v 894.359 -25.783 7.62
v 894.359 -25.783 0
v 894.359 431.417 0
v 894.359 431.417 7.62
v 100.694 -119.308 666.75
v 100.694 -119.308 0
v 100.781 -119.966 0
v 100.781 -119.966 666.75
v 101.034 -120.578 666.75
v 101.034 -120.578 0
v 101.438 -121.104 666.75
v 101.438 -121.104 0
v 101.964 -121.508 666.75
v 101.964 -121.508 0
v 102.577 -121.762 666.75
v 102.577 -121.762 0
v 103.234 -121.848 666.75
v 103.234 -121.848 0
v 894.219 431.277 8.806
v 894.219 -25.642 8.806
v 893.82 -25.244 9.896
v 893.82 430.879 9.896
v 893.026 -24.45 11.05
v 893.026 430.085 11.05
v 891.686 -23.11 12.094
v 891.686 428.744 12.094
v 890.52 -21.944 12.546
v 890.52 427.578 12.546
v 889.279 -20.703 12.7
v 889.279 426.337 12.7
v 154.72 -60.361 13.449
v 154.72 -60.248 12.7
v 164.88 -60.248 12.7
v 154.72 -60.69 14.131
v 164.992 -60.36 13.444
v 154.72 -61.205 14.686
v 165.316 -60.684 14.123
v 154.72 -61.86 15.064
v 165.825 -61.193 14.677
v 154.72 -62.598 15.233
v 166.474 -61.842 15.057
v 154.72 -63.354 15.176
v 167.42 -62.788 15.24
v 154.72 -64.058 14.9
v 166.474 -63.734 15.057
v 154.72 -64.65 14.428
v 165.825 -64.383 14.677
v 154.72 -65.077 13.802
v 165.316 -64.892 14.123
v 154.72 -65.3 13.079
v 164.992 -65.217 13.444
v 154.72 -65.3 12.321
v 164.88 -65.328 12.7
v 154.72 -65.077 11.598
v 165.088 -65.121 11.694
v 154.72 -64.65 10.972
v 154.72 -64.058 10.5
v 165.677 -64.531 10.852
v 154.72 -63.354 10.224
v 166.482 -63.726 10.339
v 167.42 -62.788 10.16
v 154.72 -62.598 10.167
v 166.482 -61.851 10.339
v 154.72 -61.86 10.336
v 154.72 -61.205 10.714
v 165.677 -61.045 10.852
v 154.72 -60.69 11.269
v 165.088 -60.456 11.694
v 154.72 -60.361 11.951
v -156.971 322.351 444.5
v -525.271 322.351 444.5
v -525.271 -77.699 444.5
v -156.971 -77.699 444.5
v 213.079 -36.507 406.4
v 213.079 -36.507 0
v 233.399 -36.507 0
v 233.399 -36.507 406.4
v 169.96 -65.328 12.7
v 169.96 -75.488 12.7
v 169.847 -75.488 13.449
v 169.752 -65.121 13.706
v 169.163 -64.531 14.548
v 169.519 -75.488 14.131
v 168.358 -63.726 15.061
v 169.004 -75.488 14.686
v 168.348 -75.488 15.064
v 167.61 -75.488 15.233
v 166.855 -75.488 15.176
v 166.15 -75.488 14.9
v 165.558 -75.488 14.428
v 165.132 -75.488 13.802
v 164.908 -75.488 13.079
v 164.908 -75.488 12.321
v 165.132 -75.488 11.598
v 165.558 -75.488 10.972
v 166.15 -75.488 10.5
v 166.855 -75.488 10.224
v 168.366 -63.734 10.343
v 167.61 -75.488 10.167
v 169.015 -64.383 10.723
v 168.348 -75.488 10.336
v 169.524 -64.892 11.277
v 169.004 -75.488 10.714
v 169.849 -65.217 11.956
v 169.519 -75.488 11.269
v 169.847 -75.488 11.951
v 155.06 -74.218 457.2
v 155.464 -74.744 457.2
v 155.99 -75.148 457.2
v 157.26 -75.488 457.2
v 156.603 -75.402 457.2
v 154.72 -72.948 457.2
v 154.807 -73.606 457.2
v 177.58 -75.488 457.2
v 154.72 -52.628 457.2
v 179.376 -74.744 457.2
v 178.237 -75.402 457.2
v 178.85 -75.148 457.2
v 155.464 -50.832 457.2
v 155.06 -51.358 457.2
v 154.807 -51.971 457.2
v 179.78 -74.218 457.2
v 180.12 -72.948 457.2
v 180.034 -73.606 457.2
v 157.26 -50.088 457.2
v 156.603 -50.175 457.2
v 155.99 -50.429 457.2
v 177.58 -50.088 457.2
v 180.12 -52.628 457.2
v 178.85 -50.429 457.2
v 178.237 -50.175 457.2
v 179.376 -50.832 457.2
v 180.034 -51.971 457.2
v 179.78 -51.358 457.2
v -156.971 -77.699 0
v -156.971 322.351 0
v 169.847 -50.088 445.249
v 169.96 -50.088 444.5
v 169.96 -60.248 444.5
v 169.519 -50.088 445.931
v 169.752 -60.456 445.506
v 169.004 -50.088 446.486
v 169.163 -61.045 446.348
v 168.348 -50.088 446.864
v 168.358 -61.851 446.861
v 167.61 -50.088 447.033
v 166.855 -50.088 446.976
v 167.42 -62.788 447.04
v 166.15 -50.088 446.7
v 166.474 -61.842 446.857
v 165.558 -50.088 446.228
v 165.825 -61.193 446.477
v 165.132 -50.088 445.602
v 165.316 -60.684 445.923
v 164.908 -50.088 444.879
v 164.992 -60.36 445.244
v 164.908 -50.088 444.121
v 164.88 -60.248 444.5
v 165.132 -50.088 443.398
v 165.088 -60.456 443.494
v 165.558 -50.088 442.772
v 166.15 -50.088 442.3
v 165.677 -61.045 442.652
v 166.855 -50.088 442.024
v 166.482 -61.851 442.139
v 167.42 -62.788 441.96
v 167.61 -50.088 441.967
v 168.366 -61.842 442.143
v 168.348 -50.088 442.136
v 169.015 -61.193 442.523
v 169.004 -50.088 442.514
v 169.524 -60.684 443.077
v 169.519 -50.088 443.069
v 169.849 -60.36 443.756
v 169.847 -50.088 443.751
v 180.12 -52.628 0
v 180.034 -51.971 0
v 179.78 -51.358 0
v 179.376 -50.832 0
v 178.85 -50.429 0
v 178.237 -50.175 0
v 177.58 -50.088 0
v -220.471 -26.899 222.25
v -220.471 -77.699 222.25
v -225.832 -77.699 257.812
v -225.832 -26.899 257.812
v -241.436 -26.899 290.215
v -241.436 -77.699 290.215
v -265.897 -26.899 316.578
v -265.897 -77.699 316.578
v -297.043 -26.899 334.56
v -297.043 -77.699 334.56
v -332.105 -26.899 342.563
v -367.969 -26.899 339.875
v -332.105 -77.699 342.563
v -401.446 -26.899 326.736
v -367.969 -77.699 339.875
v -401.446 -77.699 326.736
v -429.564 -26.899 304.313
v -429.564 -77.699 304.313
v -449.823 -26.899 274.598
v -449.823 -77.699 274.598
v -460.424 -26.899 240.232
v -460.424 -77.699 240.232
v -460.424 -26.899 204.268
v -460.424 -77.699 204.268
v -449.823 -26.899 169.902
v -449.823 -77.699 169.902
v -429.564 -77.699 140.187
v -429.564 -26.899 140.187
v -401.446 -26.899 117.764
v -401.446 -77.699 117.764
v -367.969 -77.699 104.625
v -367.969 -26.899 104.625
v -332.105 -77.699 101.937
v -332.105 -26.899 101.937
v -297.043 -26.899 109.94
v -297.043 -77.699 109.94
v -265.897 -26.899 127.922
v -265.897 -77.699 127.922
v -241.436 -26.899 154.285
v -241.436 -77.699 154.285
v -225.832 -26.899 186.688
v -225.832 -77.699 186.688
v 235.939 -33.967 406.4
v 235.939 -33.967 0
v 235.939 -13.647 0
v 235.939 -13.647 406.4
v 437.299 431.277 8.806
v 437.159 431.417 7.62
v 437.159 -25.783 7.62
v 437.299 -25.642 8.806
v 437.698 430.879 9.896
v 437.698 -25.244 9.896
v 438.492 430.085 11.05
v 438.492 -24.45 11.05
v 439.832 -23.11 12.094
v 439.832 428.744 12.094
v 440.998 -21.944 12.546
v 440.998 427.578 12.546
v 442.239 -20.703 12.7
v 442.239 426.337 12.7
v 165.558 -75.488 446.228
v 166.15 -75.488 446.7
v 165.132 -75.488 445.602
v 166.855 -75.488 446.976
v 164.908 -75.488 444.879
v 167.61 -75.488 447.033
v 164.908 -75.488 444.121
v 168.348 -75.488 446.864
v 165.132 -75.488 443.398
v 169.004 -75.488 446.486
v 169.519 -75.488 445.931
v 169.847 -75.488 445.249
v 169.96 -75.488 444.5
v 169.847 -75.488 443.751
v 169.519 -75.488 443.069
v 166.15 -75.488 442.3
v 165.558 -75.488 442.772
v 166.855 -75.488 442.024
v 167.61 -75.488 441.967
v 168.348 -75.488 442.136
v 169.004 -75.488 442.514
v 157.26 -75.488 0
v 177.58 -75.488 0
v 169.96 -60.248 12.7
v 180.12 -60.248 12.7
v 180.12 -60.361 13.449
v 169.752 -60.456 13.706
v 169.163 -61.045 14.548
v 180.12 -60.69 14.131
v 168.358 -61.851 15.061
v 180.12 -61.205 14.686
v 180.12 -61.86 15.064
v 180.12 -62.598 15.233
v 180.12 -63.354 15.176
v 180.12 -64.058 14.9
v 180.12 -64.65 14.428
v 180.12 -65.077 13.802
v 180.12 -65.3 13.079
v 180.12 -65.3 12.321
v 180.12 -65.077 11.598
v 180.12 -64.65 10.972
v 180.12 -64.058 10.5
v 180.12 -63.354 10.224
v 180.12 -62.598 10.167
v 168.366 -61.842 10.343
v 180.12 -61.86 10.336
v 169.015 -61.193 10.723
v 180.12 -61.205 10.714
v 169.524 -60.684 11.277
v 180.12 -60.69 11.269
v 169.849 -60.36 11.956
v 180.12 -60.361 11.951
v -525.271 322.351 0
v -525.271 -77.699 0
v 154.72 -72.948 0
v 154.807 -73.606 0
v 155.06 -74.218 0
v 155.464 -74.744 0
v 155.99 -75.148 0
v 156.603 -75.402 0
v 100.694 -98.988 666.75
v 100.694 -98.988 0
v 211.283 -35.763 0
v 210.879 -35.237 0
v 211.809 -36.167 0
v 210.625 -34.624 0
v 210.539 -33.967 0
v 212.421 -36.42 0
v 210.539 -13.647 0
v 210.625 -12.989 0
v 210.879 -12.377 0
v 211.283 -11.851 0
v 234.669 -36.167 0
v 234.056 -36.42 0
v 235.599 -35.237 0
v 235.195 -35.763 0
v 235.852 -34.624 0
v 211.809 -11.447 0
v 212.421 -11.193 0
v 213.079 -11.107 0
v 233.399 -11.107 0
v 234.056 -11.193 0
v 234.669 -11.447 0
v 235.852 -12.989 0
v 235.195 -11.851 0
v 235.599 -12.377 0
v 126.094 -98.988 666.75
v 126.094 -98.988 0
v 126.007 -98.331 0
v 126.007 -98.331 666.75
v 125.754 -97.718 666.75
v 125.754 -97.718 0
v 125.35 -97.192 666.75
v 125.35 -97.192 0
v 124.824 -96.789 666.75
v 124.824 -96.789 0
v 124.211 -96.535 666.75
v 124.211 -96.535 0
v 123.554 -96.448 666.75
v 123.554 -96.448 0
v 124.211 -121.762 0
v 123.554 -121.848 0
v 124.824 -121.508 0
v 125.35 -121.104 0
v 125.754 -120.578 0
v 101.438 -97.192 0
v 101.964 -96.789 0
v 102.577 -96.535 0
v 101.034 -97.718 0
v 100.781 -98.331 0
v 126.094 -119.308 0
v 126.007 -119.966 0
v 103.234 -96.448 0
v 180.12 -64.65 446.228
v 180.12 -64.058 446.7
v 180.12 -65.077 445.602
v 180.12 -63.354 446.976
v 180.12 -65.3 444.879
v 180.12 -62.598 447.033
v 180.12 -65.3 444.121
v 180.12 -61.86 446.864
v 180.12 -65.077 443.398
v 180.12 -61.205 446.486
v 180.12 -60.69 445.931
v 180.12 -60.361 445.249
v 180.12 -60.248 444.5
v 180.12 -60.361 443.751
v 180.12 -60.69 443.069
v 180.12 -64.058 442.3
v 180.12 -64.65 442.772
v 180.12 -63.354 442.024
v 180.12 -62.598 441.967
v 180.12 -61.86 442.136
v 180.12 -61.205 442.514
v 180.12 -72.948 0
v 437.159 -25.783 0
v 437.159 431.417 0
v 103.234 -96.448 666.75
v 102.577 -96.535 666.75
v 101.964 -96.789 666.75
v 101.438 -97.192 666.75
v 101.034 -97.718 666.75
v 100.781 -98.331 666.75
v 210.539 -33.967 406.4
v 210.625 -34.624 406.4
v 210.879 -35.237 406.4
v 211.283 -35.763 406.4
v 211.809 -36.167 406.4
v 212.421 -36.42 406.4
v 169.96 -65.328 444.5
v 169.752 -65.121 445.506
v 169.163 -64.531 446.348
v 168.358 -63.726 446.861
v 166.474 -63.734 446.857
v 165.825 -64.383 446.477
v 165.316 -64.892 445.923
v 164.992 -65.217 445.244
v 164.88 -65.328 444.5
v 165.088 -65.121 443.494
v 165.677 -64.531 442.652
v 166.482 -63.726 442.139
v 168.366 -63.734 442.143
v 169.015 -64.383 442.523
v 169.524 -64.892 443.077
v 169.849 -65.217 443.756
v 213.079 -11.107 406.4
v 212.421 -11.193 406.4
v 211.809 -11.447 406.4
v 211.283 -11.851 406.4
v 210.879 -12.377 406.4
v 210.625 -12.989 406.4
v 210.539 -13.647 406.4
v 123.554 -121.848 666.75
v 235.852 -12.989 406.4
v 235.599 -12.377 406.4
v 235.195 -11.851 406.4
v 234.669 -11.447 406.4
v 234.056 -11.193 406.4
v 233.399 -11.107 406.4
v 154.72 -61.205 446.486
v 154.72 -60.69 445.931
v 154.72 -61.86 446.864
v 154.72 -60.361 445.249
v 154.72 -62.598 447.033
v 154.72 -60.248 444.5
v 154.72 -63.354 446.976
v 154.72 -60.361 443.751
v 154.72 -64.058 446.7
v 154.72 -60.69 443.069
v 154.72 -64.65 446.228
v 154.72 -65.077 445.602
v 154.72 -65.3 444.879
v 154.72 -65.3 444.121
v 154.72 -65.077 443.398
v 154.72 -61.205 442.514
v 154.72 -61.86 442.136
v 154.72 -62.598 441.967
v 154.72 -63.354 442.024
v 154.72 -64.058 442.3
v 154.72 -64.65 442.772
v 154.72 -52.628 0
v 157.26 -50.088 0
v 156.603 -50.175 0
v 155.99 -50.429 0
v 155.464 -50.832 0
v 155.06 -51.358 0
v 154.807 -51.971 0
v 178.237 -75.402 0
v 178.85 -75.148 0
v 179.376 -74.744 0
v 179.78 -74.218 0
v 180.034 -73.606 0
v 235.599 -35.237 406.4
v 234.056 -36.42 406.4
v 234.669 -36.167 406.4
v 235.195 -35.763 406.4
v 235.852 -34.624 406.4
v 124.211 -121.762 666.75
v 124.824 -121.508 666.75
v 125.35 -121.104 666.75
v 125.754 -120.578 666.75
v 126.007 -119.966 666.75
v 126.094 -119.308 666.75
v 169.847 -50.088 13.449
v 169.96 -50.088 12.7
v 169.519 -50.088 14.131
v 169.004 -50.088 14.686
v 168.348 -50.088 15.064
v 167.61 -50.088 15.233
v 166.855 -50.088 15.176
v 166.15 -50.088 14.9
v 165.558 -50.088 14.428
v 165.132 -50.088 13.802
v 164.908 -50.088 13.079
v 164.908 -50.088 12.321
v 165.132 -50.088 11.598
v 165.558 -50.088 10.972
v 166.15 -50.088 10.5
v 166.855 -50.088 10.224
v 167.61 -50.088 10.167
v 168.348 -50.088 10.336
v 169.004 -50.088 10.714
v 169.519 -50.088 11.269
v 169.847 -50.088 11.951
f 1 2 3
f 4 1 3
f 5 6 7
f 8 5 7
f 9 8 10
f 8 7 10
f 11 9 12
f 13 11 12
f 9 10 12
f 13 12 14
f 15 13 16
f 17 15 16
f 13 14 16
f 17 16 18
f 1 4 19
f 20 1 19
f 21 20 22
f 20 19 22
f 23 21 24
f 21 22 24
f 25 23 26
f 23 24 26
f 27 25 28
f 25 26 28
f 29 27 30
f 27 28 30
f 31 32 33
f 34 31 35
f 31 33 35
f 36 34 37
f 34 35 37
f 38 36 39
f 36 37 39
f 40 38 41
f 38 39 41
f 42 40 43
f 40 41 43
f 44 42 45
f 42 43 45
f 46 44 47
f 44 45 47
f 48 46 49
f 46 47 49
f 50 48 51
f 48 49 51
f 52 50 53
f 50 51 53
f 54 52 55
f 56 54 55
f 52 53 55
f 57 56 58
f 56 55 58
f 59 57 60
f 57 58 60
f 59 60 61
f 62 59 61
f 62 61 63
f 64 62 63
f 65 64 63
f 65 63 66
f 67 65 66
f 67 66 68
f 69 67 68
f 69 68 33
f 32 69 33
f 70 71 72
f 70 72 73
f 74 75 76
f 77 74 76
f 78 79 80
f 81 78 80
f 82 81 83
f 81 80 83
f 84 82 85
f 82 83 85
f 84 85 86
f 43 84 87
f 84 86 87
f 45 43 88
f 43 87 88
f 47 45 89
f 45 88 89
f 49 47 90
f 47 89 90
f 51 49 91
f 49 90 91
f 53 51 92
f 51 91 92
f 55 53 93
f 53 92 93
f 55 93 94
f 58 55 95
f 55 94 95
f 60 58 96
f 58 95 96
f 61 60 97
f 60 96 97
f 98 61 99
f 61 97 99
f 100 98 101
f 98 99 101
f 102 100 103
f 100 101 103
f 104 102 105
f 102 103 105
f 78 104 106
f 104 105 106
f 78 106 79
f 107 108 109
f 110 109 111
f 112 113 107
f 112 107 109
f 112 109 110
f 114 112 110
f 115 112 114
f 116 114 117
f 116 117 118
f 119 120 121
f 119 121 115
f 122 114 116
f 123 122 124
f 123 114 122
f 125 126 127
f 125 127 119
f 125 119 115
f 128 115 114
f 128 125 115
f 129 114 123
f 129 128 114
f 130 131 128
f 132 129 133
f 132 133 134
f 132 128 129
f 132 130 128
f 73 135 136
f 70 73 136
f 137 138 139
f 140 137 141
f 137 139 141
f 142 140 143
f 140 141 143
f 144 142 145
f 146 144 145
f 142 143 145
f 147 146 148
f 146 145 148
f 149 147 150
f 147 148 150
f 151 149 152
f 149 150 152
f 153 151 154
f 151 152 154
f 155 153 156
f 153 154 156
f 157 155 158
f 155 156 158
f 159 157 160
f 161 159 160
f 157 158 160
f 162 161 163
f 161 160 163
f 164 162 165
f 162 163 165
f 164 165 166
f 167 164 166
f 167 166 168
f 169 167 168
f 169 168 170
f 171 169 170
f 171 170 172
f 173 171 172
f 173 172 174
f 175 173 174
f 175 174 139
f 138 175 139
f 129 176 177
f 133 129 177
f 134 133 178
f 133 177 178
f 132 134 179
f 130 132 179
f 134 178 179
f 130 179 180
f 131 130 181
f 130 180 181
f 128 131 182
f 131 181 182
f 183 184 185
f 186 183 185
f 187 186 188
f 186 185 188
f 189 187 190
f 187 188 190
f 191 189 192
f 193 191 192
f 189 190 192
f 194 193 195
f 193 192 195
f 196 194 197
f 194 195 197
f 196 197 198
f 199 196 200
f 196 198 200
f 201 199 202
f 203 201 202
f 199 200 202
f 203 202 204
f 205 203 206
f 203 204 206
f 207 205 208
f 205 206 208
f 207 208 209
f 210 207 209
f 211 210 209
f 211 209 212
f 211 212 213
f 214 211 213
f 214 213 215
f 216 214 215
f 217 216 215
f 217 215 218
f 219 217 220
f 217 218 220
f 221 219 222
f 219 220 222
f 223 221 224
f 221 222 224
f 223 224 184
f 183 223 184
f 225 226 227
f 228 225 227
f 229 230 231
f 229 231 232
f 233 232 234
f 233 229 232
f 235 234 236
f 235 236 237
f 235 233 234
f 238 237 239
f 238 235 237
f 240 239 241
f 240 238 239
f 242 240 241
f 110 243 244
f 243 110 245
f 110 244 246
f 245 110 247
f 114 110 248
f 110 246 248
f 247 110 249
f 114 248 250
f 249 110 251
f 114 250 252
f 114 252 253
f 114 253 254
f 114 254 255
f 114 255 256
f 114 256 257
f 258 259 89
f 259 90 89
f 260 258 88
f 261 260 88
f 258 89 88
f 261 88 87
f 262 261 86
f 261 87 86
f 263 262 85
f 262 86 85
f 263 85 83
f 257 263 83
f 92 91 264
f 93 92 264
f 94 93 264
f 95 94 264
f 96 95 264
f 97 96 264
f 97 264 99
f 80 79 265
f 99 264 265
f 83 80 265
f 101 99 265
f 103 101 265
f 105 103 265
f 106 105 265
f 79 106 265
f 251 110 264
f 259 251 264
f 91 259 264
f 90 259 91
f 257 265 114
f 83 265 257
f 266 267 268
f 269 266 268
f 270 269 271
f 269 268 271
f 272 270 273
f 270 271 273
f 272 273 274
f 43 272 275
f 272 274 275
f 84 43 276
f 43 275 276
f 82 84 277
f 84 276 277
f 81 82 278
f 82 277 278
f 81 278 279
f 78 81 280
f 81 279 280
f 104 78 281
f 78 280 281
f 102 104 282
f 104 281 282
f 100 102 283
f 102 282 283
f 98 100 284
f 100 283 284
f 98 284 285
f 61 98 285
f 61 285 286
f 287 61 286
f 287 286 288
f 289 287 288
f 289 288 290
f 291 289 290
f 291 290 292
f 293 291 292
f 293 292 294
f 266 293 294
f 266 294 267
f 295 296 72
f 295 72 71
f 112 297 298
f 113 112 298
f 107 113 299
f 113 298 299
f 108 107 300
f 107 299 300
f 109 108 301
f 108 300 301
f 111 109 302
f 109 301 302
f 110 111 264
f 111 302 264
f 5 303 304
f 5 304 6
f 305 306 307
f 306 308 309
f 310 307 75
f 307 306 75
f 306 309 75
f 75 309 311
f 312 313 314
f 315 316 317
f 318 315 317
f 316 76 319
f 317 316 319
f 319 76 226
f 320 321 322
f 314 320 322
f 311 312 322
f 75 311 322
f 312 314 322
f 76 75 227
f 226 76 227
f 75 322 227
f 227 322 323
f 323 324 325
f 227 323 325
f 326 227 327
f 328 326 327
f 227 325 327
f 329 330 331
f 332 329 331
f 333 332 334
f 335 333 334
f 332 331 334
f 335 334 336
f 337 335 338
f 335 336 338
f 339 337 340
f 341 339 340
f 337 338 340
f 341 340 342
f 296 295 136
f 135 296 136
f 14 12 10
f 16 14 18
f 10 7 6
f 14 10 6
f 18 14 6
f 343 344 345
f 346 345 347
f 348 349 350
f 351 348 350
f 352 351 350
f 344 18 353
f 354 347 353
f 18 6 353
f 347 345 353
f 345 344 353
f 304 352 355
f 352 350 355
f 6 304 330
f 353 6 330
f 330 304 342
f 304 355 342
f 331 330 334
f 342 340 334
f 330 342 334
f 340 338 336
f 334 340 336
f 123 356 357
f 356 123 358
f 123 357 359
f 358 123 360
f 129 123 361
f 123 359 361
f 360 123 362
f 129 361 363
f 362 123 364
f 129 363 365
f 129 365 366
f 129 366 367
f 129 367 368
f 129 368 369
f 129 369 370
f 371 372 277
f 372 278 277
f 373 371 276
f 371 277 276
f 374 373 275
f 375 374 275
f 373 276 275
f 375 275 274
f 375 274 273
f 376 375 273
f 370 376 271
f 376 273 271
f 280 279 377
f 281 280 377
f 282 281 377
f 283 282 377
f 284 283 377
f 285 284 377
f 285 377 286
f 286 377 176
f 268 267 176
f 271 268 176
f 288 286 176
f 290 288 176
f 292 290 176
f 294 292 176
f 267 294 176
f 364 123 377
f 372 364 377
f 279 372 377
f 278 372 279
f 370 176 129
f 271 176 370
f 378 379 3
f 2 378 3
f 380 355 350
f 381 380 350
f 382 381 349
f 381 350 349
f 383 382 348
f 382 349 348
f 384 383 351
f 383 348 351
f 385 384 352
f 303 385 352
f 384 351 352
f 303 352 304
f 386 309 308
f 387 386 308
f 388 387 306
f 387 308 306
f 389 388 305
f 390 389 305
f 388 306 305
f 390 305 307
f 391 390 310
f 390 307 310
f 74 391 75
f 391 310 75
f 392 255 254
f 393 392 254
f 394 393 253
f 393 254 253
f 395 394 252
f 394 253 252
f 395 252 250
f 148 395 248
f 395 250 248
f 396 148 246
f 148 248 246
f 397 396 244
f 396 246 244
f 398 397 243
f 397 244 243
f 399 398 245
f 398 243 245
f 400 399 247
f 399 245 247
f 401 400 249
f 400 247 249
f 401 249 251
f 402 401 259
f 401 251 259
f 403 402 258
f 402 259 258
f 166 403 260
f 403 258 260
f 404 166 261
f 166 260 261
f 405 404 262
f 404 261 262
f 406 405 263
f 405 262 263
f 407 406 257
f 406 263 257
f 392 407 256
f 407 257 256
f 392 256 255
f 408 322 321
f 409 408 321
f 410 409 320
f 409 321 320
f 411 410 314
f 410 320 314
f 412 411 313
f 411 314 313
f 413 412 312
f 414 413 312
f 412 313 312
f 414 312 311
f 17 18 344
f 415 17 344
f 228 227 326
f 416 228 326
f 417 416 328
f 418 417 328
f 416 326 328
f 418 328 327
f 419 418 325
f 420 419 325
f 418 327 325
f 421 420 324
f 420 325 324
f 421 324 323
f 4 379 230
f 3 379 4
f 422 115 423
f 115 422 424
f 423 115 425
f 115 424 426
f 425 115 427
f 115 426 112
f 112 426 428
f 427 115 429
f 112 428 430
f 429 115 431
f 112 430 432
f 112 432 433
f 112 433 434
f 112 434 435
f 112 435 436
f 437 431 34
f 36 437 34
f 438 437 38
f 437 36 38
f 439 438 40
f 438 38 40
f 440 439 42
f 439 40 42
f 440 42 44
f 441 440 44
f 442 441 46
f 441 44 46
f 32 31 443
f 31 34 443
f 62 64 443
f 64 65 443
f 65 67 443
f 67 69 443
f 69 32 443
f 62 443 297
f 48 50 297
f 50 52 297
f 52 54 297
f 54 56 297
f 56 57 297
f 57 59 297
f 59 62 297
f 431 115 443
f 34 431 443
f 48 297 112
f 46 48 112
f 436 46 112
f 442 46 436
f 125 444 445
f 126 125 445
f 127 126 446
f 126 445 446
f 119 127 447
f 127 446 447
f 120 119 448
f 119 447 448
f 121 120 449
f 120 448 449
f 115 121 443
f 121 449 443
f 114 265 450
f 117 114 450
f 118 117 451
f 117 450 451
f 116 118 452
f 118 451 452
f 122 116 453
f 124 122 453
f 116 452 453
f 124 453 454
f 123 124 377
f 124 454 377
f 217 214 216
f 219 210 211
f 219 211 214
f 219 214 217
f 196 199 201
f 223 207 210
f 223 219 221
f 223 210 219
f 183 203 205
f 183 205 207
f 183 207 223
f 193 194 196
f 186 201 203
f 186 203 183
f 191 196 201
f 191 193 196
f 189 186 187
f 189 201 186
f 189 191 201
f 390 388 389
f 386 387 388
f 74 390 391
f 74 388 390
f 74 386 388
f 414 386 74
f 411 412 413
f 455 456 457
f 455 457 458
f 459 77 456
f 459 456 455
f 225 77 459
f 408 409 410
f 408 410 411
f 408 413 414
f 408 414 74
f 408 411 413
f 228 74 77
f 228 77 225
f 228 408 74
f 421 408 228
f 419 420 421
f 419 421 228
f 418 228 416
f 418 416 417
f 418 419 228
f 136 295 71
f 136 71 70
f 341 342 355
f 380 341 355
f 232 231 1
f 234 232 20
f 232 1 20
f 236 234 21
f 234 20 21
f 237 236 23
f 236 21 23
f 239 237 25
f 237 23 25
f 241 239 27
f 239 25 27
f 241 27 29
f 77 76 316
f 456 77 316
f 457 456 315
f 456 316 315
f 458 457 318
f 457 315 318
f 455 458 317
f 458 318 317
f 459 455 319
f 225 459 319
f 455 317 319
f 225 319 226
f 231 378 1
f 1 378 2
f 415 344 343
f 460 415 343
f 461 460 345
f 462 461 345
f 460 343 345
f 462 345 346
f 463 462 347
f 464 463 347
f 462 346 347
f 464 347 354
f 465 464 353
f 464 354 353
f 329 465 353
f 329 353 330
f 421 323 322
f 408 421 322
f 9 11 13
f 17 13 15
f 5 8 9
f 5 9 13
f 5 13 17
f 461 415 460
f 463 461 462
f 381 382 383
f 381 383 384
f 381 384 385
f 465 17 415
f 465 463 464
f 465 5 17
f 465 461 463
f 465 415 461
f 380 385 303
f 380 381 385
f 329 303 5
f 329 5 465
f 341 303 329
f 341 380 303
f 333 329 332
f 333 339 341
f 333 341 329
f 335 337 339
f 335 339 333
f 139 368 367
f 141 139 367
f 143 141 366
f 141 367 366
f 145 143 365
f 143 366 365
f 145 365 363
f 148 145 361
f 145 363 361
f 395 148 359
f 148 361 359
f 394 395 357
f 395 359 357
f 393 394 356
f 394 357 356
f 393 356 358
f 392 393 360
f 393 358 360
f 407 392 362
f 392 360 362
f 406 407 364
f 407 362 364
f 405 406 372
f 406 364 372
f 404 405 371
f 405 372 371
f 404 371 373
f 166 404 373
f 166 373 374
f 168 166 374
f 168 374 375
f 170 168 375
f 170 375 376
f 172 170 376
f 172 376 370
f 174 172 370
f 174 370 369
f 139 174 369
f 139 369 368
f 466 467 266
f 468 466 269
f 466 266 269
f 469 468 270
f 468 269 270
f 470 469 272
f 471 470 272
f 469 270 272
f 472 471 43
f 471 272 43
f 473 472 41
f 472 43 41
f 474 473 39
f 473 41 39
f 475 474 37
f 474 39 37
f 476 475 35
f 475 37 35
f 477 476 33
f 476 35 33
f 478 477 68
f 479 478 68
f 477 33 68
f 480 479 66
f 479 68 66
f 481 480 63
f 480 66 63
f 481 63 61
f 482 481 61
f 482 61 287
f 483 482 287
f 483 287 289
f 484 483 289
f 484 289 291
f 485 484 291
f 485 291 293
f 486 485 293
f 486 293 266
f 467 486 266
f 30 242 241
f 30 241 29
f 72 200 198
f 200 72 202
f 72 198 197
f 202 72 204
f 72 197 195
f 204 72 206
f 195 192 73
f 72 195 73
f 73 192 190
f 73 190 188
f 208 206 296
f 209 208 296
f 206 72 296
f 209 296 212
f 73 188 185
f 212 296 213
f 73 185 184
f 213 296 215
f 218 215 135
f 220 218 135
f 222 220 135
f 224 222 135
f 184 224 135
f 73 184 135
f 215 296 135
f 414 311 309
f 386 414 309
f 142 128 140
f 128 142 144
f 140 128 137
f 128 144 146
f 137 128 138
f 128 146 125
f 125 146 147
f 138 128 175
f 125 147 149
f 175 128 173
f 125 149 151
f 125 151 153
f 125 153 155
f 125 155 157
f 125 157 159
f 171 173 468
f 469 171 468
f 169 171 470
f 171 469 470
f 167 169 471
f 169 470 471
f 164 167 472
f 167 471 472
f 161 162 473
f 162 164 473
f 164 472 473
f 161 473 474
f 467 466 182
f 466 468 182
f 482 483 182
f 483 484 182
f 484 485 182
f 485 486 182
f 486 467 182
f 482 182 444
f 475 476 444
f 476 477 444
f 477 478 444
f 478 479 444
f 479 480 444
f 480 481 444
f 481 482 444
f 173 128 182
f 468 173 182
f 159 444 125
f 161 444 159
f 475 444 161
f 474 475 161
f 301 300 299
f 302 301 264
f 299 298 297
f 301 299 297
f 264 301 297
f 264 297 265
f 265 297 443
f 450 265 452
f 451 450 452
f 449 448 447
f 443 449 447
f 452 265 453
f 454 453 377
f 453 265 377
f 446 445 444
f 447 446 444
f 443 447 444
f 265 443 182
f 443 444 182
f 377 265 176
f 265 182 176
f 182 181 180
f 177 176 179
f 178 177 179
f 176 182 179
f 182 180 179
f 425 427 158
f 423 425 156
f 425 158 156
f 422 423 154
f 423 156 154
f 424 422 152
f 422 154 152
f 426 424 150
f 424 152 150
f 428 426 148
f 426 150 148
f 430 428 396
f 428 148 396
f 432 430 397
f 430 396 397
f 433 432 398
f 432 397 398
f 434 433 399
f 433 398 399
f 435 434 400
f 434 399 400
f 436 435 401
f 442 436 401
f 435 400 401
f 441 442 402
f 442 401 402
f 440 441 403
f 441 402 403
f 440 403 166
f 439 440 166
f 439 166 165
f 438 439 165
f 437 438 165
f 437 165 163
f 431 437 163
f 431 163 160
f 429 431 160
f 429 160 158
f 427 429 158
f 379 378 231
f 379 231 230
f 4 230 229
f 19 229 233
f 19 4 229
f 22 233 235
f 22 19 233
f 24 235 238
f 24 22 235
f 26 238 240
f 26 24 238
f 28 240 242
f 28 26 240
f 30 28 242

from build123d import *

# Parameters (mm, degrees)
F0_W      = 368.3
F0_H      = 400.05
F1_DEPTH  = 444.5
F2_R      = 120.65
F3_DEPTH  = 50.8
F5_DEPTH  = 666.75
F7_DEPTH  = 457.2
F9_DEPTH  = 406.4
F10_W     = 457.2
F10_H     = 457.2
F11_DEPTH = 12.7
F12_R     = 5.08
F13_R     = 2.54
F14_DEPTH = 25.4
F15_R     = 2.54
F16_DEPTH = 25.4


with BuildPart() as f1:
    # F0 (on Top) → F1 (new body)
    with BuildSketch(Plane.XY):
        with Locations((-341.12138, 122.32554)):
            Rectangle(F0_W, F0_H)
    extrude(amount=F1_DEPTH)

    # F2 (on face) → F3 (cut)
    with BuildSketch(Plane.XZ.offset(77.69946)):
        with Locations((-341.12138, 222.25)):
            Circle(F2_R)
    extrude(amount=-F3_DEPTH, mode=Mode.SUBTRACT)


with BuildPart() as f5:
    # F4 (on Top) → F5 (new body)
    with BuildSketch(Plane.XY):
        with BuildLine():
            Line((103.234016, -121.848408), (123.554016, -121.848408))
            ThreePointArc((123.554016, -121.848408), (125.350067, -121.10446), (126.094016, -119.308408))
            Line((126.094016, -119.308408), (126.094016, -98.988408))
            ThreePointArc((126.094016, -98.988408), (125.350067, -97.192357), (123.554016, -96.448408))
            Line((123.554016, -96.448408), (103.234016, -96.448408))
            ThreePointArc((103.234016, -96.448408), (101.437964, -97.192357), (100.694016, -98.988408))
            Line((100.694016, -98.988408), (100.694016, -119.308408))
            ThreePointArc((100.694016, -119.308408), (101.437964, -121.10446), (103.234016, -121.848408))
        make_face()
    extrude(amount=F5_DEPTH)


with BuildPart() as f7:
    # F6 (on Top) → F7 (new body)
    with BuildSketch(Plane.XY):
        with BuildLine():
            Line((157.260098, -75.488299), (177.580098, -75.488299))
            ThreePointArc((177.580098, -75.488299), (179.376149, -74.74435), (180.120098, -72.948299))
            Line((180.120098, -72.948299), (180.120098, -52.628299))
            ThreePointArc((180.120098, -52.628299), (179.376149, -50.832248), (177.580098, -50.088299))
            Line((177.580098, -50.088299), (157.260098, -50.088299))
            ThreePointArc((157.260098, -50.088299), (155.464047, -50.832248), (154.720098, -52.628299))
            Line((154.720098, -52.628299), (154.720098, -72.948299))
            ThreePointArc((154.720098, -72.948299), (155.464047, -74.74435), (157.260098, -75.488299))
        make_face()
    extrude(amount=F7_DEPTH)

    # F13 (on face) → F14 (cut)
    with BuildSketch(Plane.XZ.offset(75.488299)):
        with Locations((167.420098, 12.7)):
            Circle(F13_R)
        with Locations((167.420098, 444.5)):
            Circle(F13_R)
    extrude(amount=-F14_DEPTH, mode=Mode.SUBTRACT)

    # F15 (on face) → F16 (cut)
    with BuildSketch(Plane.YZ.offset(180.120098)):
        with Locations((-62.788299, 12.7)):
            Circle(F15_R)
        with Locations((-62.788299, 444.5)):
            Circle(F15_R)
    extrude(amount=-F16_DEPTH, mode=Mode.SUBTRACT)


with BuildPart() as f9:
    # F8 (on Top) → F9 (new body)
    with BuildSketch(Plane.XY):
        with BuildLine():
            Line((213.078841, -36.506822), (233.398841, -36.506822))
            ThreePointArc((233.398841, -36.506822), (235.194892, -35.762873), (235.938841, -33.966822))
            Line((235.938841, -33.966822), (235.938841, -13.646822))
            ThreePointArc((235.938841, -13.646822), (235.194892, -11.85077), (233.398841, -11.106822))
            Line((233.398841, -11.106822), (213.078841, -11.106822))
            ThreePointArc((213.078841, -11.106822), (211.282789, -11.85077), (210.538841, -13.646822))
            Line((210.538841, -13.646822), (210.538841, -33.966822))
            ThreePointArc((210.538841, -33.966822), (211.282789, -35.762873), (213.078841, -36.506822))
        make_face()
    extrude(amount=F9_DEPTH)


with BuildPart() as f11:
    # F10 (on Top) → F11 (new body)
    with BuildSketch(Plane.XY):
        with Locations((665.759002, 202.81735)):
            Rectangle(F10_W, F10_H)
    extrude(amount=F11_DEPTH)

    # F12
    f12_edges = [f11.edges().sort_by_distance(p)[0] for p in [
        (437.159002, 202.81735, 12.7),
        (665.759002, -25.78265, 12.7),
        (894.359002, 202.81735, 12.7),
        (665.759002, 431.41735, 12.7),
    ]]
    fillet(f12_edges, radius=F12_R)


solid = Compound([f1.part, f5.part, f7.part, f9.part, f11.part])
